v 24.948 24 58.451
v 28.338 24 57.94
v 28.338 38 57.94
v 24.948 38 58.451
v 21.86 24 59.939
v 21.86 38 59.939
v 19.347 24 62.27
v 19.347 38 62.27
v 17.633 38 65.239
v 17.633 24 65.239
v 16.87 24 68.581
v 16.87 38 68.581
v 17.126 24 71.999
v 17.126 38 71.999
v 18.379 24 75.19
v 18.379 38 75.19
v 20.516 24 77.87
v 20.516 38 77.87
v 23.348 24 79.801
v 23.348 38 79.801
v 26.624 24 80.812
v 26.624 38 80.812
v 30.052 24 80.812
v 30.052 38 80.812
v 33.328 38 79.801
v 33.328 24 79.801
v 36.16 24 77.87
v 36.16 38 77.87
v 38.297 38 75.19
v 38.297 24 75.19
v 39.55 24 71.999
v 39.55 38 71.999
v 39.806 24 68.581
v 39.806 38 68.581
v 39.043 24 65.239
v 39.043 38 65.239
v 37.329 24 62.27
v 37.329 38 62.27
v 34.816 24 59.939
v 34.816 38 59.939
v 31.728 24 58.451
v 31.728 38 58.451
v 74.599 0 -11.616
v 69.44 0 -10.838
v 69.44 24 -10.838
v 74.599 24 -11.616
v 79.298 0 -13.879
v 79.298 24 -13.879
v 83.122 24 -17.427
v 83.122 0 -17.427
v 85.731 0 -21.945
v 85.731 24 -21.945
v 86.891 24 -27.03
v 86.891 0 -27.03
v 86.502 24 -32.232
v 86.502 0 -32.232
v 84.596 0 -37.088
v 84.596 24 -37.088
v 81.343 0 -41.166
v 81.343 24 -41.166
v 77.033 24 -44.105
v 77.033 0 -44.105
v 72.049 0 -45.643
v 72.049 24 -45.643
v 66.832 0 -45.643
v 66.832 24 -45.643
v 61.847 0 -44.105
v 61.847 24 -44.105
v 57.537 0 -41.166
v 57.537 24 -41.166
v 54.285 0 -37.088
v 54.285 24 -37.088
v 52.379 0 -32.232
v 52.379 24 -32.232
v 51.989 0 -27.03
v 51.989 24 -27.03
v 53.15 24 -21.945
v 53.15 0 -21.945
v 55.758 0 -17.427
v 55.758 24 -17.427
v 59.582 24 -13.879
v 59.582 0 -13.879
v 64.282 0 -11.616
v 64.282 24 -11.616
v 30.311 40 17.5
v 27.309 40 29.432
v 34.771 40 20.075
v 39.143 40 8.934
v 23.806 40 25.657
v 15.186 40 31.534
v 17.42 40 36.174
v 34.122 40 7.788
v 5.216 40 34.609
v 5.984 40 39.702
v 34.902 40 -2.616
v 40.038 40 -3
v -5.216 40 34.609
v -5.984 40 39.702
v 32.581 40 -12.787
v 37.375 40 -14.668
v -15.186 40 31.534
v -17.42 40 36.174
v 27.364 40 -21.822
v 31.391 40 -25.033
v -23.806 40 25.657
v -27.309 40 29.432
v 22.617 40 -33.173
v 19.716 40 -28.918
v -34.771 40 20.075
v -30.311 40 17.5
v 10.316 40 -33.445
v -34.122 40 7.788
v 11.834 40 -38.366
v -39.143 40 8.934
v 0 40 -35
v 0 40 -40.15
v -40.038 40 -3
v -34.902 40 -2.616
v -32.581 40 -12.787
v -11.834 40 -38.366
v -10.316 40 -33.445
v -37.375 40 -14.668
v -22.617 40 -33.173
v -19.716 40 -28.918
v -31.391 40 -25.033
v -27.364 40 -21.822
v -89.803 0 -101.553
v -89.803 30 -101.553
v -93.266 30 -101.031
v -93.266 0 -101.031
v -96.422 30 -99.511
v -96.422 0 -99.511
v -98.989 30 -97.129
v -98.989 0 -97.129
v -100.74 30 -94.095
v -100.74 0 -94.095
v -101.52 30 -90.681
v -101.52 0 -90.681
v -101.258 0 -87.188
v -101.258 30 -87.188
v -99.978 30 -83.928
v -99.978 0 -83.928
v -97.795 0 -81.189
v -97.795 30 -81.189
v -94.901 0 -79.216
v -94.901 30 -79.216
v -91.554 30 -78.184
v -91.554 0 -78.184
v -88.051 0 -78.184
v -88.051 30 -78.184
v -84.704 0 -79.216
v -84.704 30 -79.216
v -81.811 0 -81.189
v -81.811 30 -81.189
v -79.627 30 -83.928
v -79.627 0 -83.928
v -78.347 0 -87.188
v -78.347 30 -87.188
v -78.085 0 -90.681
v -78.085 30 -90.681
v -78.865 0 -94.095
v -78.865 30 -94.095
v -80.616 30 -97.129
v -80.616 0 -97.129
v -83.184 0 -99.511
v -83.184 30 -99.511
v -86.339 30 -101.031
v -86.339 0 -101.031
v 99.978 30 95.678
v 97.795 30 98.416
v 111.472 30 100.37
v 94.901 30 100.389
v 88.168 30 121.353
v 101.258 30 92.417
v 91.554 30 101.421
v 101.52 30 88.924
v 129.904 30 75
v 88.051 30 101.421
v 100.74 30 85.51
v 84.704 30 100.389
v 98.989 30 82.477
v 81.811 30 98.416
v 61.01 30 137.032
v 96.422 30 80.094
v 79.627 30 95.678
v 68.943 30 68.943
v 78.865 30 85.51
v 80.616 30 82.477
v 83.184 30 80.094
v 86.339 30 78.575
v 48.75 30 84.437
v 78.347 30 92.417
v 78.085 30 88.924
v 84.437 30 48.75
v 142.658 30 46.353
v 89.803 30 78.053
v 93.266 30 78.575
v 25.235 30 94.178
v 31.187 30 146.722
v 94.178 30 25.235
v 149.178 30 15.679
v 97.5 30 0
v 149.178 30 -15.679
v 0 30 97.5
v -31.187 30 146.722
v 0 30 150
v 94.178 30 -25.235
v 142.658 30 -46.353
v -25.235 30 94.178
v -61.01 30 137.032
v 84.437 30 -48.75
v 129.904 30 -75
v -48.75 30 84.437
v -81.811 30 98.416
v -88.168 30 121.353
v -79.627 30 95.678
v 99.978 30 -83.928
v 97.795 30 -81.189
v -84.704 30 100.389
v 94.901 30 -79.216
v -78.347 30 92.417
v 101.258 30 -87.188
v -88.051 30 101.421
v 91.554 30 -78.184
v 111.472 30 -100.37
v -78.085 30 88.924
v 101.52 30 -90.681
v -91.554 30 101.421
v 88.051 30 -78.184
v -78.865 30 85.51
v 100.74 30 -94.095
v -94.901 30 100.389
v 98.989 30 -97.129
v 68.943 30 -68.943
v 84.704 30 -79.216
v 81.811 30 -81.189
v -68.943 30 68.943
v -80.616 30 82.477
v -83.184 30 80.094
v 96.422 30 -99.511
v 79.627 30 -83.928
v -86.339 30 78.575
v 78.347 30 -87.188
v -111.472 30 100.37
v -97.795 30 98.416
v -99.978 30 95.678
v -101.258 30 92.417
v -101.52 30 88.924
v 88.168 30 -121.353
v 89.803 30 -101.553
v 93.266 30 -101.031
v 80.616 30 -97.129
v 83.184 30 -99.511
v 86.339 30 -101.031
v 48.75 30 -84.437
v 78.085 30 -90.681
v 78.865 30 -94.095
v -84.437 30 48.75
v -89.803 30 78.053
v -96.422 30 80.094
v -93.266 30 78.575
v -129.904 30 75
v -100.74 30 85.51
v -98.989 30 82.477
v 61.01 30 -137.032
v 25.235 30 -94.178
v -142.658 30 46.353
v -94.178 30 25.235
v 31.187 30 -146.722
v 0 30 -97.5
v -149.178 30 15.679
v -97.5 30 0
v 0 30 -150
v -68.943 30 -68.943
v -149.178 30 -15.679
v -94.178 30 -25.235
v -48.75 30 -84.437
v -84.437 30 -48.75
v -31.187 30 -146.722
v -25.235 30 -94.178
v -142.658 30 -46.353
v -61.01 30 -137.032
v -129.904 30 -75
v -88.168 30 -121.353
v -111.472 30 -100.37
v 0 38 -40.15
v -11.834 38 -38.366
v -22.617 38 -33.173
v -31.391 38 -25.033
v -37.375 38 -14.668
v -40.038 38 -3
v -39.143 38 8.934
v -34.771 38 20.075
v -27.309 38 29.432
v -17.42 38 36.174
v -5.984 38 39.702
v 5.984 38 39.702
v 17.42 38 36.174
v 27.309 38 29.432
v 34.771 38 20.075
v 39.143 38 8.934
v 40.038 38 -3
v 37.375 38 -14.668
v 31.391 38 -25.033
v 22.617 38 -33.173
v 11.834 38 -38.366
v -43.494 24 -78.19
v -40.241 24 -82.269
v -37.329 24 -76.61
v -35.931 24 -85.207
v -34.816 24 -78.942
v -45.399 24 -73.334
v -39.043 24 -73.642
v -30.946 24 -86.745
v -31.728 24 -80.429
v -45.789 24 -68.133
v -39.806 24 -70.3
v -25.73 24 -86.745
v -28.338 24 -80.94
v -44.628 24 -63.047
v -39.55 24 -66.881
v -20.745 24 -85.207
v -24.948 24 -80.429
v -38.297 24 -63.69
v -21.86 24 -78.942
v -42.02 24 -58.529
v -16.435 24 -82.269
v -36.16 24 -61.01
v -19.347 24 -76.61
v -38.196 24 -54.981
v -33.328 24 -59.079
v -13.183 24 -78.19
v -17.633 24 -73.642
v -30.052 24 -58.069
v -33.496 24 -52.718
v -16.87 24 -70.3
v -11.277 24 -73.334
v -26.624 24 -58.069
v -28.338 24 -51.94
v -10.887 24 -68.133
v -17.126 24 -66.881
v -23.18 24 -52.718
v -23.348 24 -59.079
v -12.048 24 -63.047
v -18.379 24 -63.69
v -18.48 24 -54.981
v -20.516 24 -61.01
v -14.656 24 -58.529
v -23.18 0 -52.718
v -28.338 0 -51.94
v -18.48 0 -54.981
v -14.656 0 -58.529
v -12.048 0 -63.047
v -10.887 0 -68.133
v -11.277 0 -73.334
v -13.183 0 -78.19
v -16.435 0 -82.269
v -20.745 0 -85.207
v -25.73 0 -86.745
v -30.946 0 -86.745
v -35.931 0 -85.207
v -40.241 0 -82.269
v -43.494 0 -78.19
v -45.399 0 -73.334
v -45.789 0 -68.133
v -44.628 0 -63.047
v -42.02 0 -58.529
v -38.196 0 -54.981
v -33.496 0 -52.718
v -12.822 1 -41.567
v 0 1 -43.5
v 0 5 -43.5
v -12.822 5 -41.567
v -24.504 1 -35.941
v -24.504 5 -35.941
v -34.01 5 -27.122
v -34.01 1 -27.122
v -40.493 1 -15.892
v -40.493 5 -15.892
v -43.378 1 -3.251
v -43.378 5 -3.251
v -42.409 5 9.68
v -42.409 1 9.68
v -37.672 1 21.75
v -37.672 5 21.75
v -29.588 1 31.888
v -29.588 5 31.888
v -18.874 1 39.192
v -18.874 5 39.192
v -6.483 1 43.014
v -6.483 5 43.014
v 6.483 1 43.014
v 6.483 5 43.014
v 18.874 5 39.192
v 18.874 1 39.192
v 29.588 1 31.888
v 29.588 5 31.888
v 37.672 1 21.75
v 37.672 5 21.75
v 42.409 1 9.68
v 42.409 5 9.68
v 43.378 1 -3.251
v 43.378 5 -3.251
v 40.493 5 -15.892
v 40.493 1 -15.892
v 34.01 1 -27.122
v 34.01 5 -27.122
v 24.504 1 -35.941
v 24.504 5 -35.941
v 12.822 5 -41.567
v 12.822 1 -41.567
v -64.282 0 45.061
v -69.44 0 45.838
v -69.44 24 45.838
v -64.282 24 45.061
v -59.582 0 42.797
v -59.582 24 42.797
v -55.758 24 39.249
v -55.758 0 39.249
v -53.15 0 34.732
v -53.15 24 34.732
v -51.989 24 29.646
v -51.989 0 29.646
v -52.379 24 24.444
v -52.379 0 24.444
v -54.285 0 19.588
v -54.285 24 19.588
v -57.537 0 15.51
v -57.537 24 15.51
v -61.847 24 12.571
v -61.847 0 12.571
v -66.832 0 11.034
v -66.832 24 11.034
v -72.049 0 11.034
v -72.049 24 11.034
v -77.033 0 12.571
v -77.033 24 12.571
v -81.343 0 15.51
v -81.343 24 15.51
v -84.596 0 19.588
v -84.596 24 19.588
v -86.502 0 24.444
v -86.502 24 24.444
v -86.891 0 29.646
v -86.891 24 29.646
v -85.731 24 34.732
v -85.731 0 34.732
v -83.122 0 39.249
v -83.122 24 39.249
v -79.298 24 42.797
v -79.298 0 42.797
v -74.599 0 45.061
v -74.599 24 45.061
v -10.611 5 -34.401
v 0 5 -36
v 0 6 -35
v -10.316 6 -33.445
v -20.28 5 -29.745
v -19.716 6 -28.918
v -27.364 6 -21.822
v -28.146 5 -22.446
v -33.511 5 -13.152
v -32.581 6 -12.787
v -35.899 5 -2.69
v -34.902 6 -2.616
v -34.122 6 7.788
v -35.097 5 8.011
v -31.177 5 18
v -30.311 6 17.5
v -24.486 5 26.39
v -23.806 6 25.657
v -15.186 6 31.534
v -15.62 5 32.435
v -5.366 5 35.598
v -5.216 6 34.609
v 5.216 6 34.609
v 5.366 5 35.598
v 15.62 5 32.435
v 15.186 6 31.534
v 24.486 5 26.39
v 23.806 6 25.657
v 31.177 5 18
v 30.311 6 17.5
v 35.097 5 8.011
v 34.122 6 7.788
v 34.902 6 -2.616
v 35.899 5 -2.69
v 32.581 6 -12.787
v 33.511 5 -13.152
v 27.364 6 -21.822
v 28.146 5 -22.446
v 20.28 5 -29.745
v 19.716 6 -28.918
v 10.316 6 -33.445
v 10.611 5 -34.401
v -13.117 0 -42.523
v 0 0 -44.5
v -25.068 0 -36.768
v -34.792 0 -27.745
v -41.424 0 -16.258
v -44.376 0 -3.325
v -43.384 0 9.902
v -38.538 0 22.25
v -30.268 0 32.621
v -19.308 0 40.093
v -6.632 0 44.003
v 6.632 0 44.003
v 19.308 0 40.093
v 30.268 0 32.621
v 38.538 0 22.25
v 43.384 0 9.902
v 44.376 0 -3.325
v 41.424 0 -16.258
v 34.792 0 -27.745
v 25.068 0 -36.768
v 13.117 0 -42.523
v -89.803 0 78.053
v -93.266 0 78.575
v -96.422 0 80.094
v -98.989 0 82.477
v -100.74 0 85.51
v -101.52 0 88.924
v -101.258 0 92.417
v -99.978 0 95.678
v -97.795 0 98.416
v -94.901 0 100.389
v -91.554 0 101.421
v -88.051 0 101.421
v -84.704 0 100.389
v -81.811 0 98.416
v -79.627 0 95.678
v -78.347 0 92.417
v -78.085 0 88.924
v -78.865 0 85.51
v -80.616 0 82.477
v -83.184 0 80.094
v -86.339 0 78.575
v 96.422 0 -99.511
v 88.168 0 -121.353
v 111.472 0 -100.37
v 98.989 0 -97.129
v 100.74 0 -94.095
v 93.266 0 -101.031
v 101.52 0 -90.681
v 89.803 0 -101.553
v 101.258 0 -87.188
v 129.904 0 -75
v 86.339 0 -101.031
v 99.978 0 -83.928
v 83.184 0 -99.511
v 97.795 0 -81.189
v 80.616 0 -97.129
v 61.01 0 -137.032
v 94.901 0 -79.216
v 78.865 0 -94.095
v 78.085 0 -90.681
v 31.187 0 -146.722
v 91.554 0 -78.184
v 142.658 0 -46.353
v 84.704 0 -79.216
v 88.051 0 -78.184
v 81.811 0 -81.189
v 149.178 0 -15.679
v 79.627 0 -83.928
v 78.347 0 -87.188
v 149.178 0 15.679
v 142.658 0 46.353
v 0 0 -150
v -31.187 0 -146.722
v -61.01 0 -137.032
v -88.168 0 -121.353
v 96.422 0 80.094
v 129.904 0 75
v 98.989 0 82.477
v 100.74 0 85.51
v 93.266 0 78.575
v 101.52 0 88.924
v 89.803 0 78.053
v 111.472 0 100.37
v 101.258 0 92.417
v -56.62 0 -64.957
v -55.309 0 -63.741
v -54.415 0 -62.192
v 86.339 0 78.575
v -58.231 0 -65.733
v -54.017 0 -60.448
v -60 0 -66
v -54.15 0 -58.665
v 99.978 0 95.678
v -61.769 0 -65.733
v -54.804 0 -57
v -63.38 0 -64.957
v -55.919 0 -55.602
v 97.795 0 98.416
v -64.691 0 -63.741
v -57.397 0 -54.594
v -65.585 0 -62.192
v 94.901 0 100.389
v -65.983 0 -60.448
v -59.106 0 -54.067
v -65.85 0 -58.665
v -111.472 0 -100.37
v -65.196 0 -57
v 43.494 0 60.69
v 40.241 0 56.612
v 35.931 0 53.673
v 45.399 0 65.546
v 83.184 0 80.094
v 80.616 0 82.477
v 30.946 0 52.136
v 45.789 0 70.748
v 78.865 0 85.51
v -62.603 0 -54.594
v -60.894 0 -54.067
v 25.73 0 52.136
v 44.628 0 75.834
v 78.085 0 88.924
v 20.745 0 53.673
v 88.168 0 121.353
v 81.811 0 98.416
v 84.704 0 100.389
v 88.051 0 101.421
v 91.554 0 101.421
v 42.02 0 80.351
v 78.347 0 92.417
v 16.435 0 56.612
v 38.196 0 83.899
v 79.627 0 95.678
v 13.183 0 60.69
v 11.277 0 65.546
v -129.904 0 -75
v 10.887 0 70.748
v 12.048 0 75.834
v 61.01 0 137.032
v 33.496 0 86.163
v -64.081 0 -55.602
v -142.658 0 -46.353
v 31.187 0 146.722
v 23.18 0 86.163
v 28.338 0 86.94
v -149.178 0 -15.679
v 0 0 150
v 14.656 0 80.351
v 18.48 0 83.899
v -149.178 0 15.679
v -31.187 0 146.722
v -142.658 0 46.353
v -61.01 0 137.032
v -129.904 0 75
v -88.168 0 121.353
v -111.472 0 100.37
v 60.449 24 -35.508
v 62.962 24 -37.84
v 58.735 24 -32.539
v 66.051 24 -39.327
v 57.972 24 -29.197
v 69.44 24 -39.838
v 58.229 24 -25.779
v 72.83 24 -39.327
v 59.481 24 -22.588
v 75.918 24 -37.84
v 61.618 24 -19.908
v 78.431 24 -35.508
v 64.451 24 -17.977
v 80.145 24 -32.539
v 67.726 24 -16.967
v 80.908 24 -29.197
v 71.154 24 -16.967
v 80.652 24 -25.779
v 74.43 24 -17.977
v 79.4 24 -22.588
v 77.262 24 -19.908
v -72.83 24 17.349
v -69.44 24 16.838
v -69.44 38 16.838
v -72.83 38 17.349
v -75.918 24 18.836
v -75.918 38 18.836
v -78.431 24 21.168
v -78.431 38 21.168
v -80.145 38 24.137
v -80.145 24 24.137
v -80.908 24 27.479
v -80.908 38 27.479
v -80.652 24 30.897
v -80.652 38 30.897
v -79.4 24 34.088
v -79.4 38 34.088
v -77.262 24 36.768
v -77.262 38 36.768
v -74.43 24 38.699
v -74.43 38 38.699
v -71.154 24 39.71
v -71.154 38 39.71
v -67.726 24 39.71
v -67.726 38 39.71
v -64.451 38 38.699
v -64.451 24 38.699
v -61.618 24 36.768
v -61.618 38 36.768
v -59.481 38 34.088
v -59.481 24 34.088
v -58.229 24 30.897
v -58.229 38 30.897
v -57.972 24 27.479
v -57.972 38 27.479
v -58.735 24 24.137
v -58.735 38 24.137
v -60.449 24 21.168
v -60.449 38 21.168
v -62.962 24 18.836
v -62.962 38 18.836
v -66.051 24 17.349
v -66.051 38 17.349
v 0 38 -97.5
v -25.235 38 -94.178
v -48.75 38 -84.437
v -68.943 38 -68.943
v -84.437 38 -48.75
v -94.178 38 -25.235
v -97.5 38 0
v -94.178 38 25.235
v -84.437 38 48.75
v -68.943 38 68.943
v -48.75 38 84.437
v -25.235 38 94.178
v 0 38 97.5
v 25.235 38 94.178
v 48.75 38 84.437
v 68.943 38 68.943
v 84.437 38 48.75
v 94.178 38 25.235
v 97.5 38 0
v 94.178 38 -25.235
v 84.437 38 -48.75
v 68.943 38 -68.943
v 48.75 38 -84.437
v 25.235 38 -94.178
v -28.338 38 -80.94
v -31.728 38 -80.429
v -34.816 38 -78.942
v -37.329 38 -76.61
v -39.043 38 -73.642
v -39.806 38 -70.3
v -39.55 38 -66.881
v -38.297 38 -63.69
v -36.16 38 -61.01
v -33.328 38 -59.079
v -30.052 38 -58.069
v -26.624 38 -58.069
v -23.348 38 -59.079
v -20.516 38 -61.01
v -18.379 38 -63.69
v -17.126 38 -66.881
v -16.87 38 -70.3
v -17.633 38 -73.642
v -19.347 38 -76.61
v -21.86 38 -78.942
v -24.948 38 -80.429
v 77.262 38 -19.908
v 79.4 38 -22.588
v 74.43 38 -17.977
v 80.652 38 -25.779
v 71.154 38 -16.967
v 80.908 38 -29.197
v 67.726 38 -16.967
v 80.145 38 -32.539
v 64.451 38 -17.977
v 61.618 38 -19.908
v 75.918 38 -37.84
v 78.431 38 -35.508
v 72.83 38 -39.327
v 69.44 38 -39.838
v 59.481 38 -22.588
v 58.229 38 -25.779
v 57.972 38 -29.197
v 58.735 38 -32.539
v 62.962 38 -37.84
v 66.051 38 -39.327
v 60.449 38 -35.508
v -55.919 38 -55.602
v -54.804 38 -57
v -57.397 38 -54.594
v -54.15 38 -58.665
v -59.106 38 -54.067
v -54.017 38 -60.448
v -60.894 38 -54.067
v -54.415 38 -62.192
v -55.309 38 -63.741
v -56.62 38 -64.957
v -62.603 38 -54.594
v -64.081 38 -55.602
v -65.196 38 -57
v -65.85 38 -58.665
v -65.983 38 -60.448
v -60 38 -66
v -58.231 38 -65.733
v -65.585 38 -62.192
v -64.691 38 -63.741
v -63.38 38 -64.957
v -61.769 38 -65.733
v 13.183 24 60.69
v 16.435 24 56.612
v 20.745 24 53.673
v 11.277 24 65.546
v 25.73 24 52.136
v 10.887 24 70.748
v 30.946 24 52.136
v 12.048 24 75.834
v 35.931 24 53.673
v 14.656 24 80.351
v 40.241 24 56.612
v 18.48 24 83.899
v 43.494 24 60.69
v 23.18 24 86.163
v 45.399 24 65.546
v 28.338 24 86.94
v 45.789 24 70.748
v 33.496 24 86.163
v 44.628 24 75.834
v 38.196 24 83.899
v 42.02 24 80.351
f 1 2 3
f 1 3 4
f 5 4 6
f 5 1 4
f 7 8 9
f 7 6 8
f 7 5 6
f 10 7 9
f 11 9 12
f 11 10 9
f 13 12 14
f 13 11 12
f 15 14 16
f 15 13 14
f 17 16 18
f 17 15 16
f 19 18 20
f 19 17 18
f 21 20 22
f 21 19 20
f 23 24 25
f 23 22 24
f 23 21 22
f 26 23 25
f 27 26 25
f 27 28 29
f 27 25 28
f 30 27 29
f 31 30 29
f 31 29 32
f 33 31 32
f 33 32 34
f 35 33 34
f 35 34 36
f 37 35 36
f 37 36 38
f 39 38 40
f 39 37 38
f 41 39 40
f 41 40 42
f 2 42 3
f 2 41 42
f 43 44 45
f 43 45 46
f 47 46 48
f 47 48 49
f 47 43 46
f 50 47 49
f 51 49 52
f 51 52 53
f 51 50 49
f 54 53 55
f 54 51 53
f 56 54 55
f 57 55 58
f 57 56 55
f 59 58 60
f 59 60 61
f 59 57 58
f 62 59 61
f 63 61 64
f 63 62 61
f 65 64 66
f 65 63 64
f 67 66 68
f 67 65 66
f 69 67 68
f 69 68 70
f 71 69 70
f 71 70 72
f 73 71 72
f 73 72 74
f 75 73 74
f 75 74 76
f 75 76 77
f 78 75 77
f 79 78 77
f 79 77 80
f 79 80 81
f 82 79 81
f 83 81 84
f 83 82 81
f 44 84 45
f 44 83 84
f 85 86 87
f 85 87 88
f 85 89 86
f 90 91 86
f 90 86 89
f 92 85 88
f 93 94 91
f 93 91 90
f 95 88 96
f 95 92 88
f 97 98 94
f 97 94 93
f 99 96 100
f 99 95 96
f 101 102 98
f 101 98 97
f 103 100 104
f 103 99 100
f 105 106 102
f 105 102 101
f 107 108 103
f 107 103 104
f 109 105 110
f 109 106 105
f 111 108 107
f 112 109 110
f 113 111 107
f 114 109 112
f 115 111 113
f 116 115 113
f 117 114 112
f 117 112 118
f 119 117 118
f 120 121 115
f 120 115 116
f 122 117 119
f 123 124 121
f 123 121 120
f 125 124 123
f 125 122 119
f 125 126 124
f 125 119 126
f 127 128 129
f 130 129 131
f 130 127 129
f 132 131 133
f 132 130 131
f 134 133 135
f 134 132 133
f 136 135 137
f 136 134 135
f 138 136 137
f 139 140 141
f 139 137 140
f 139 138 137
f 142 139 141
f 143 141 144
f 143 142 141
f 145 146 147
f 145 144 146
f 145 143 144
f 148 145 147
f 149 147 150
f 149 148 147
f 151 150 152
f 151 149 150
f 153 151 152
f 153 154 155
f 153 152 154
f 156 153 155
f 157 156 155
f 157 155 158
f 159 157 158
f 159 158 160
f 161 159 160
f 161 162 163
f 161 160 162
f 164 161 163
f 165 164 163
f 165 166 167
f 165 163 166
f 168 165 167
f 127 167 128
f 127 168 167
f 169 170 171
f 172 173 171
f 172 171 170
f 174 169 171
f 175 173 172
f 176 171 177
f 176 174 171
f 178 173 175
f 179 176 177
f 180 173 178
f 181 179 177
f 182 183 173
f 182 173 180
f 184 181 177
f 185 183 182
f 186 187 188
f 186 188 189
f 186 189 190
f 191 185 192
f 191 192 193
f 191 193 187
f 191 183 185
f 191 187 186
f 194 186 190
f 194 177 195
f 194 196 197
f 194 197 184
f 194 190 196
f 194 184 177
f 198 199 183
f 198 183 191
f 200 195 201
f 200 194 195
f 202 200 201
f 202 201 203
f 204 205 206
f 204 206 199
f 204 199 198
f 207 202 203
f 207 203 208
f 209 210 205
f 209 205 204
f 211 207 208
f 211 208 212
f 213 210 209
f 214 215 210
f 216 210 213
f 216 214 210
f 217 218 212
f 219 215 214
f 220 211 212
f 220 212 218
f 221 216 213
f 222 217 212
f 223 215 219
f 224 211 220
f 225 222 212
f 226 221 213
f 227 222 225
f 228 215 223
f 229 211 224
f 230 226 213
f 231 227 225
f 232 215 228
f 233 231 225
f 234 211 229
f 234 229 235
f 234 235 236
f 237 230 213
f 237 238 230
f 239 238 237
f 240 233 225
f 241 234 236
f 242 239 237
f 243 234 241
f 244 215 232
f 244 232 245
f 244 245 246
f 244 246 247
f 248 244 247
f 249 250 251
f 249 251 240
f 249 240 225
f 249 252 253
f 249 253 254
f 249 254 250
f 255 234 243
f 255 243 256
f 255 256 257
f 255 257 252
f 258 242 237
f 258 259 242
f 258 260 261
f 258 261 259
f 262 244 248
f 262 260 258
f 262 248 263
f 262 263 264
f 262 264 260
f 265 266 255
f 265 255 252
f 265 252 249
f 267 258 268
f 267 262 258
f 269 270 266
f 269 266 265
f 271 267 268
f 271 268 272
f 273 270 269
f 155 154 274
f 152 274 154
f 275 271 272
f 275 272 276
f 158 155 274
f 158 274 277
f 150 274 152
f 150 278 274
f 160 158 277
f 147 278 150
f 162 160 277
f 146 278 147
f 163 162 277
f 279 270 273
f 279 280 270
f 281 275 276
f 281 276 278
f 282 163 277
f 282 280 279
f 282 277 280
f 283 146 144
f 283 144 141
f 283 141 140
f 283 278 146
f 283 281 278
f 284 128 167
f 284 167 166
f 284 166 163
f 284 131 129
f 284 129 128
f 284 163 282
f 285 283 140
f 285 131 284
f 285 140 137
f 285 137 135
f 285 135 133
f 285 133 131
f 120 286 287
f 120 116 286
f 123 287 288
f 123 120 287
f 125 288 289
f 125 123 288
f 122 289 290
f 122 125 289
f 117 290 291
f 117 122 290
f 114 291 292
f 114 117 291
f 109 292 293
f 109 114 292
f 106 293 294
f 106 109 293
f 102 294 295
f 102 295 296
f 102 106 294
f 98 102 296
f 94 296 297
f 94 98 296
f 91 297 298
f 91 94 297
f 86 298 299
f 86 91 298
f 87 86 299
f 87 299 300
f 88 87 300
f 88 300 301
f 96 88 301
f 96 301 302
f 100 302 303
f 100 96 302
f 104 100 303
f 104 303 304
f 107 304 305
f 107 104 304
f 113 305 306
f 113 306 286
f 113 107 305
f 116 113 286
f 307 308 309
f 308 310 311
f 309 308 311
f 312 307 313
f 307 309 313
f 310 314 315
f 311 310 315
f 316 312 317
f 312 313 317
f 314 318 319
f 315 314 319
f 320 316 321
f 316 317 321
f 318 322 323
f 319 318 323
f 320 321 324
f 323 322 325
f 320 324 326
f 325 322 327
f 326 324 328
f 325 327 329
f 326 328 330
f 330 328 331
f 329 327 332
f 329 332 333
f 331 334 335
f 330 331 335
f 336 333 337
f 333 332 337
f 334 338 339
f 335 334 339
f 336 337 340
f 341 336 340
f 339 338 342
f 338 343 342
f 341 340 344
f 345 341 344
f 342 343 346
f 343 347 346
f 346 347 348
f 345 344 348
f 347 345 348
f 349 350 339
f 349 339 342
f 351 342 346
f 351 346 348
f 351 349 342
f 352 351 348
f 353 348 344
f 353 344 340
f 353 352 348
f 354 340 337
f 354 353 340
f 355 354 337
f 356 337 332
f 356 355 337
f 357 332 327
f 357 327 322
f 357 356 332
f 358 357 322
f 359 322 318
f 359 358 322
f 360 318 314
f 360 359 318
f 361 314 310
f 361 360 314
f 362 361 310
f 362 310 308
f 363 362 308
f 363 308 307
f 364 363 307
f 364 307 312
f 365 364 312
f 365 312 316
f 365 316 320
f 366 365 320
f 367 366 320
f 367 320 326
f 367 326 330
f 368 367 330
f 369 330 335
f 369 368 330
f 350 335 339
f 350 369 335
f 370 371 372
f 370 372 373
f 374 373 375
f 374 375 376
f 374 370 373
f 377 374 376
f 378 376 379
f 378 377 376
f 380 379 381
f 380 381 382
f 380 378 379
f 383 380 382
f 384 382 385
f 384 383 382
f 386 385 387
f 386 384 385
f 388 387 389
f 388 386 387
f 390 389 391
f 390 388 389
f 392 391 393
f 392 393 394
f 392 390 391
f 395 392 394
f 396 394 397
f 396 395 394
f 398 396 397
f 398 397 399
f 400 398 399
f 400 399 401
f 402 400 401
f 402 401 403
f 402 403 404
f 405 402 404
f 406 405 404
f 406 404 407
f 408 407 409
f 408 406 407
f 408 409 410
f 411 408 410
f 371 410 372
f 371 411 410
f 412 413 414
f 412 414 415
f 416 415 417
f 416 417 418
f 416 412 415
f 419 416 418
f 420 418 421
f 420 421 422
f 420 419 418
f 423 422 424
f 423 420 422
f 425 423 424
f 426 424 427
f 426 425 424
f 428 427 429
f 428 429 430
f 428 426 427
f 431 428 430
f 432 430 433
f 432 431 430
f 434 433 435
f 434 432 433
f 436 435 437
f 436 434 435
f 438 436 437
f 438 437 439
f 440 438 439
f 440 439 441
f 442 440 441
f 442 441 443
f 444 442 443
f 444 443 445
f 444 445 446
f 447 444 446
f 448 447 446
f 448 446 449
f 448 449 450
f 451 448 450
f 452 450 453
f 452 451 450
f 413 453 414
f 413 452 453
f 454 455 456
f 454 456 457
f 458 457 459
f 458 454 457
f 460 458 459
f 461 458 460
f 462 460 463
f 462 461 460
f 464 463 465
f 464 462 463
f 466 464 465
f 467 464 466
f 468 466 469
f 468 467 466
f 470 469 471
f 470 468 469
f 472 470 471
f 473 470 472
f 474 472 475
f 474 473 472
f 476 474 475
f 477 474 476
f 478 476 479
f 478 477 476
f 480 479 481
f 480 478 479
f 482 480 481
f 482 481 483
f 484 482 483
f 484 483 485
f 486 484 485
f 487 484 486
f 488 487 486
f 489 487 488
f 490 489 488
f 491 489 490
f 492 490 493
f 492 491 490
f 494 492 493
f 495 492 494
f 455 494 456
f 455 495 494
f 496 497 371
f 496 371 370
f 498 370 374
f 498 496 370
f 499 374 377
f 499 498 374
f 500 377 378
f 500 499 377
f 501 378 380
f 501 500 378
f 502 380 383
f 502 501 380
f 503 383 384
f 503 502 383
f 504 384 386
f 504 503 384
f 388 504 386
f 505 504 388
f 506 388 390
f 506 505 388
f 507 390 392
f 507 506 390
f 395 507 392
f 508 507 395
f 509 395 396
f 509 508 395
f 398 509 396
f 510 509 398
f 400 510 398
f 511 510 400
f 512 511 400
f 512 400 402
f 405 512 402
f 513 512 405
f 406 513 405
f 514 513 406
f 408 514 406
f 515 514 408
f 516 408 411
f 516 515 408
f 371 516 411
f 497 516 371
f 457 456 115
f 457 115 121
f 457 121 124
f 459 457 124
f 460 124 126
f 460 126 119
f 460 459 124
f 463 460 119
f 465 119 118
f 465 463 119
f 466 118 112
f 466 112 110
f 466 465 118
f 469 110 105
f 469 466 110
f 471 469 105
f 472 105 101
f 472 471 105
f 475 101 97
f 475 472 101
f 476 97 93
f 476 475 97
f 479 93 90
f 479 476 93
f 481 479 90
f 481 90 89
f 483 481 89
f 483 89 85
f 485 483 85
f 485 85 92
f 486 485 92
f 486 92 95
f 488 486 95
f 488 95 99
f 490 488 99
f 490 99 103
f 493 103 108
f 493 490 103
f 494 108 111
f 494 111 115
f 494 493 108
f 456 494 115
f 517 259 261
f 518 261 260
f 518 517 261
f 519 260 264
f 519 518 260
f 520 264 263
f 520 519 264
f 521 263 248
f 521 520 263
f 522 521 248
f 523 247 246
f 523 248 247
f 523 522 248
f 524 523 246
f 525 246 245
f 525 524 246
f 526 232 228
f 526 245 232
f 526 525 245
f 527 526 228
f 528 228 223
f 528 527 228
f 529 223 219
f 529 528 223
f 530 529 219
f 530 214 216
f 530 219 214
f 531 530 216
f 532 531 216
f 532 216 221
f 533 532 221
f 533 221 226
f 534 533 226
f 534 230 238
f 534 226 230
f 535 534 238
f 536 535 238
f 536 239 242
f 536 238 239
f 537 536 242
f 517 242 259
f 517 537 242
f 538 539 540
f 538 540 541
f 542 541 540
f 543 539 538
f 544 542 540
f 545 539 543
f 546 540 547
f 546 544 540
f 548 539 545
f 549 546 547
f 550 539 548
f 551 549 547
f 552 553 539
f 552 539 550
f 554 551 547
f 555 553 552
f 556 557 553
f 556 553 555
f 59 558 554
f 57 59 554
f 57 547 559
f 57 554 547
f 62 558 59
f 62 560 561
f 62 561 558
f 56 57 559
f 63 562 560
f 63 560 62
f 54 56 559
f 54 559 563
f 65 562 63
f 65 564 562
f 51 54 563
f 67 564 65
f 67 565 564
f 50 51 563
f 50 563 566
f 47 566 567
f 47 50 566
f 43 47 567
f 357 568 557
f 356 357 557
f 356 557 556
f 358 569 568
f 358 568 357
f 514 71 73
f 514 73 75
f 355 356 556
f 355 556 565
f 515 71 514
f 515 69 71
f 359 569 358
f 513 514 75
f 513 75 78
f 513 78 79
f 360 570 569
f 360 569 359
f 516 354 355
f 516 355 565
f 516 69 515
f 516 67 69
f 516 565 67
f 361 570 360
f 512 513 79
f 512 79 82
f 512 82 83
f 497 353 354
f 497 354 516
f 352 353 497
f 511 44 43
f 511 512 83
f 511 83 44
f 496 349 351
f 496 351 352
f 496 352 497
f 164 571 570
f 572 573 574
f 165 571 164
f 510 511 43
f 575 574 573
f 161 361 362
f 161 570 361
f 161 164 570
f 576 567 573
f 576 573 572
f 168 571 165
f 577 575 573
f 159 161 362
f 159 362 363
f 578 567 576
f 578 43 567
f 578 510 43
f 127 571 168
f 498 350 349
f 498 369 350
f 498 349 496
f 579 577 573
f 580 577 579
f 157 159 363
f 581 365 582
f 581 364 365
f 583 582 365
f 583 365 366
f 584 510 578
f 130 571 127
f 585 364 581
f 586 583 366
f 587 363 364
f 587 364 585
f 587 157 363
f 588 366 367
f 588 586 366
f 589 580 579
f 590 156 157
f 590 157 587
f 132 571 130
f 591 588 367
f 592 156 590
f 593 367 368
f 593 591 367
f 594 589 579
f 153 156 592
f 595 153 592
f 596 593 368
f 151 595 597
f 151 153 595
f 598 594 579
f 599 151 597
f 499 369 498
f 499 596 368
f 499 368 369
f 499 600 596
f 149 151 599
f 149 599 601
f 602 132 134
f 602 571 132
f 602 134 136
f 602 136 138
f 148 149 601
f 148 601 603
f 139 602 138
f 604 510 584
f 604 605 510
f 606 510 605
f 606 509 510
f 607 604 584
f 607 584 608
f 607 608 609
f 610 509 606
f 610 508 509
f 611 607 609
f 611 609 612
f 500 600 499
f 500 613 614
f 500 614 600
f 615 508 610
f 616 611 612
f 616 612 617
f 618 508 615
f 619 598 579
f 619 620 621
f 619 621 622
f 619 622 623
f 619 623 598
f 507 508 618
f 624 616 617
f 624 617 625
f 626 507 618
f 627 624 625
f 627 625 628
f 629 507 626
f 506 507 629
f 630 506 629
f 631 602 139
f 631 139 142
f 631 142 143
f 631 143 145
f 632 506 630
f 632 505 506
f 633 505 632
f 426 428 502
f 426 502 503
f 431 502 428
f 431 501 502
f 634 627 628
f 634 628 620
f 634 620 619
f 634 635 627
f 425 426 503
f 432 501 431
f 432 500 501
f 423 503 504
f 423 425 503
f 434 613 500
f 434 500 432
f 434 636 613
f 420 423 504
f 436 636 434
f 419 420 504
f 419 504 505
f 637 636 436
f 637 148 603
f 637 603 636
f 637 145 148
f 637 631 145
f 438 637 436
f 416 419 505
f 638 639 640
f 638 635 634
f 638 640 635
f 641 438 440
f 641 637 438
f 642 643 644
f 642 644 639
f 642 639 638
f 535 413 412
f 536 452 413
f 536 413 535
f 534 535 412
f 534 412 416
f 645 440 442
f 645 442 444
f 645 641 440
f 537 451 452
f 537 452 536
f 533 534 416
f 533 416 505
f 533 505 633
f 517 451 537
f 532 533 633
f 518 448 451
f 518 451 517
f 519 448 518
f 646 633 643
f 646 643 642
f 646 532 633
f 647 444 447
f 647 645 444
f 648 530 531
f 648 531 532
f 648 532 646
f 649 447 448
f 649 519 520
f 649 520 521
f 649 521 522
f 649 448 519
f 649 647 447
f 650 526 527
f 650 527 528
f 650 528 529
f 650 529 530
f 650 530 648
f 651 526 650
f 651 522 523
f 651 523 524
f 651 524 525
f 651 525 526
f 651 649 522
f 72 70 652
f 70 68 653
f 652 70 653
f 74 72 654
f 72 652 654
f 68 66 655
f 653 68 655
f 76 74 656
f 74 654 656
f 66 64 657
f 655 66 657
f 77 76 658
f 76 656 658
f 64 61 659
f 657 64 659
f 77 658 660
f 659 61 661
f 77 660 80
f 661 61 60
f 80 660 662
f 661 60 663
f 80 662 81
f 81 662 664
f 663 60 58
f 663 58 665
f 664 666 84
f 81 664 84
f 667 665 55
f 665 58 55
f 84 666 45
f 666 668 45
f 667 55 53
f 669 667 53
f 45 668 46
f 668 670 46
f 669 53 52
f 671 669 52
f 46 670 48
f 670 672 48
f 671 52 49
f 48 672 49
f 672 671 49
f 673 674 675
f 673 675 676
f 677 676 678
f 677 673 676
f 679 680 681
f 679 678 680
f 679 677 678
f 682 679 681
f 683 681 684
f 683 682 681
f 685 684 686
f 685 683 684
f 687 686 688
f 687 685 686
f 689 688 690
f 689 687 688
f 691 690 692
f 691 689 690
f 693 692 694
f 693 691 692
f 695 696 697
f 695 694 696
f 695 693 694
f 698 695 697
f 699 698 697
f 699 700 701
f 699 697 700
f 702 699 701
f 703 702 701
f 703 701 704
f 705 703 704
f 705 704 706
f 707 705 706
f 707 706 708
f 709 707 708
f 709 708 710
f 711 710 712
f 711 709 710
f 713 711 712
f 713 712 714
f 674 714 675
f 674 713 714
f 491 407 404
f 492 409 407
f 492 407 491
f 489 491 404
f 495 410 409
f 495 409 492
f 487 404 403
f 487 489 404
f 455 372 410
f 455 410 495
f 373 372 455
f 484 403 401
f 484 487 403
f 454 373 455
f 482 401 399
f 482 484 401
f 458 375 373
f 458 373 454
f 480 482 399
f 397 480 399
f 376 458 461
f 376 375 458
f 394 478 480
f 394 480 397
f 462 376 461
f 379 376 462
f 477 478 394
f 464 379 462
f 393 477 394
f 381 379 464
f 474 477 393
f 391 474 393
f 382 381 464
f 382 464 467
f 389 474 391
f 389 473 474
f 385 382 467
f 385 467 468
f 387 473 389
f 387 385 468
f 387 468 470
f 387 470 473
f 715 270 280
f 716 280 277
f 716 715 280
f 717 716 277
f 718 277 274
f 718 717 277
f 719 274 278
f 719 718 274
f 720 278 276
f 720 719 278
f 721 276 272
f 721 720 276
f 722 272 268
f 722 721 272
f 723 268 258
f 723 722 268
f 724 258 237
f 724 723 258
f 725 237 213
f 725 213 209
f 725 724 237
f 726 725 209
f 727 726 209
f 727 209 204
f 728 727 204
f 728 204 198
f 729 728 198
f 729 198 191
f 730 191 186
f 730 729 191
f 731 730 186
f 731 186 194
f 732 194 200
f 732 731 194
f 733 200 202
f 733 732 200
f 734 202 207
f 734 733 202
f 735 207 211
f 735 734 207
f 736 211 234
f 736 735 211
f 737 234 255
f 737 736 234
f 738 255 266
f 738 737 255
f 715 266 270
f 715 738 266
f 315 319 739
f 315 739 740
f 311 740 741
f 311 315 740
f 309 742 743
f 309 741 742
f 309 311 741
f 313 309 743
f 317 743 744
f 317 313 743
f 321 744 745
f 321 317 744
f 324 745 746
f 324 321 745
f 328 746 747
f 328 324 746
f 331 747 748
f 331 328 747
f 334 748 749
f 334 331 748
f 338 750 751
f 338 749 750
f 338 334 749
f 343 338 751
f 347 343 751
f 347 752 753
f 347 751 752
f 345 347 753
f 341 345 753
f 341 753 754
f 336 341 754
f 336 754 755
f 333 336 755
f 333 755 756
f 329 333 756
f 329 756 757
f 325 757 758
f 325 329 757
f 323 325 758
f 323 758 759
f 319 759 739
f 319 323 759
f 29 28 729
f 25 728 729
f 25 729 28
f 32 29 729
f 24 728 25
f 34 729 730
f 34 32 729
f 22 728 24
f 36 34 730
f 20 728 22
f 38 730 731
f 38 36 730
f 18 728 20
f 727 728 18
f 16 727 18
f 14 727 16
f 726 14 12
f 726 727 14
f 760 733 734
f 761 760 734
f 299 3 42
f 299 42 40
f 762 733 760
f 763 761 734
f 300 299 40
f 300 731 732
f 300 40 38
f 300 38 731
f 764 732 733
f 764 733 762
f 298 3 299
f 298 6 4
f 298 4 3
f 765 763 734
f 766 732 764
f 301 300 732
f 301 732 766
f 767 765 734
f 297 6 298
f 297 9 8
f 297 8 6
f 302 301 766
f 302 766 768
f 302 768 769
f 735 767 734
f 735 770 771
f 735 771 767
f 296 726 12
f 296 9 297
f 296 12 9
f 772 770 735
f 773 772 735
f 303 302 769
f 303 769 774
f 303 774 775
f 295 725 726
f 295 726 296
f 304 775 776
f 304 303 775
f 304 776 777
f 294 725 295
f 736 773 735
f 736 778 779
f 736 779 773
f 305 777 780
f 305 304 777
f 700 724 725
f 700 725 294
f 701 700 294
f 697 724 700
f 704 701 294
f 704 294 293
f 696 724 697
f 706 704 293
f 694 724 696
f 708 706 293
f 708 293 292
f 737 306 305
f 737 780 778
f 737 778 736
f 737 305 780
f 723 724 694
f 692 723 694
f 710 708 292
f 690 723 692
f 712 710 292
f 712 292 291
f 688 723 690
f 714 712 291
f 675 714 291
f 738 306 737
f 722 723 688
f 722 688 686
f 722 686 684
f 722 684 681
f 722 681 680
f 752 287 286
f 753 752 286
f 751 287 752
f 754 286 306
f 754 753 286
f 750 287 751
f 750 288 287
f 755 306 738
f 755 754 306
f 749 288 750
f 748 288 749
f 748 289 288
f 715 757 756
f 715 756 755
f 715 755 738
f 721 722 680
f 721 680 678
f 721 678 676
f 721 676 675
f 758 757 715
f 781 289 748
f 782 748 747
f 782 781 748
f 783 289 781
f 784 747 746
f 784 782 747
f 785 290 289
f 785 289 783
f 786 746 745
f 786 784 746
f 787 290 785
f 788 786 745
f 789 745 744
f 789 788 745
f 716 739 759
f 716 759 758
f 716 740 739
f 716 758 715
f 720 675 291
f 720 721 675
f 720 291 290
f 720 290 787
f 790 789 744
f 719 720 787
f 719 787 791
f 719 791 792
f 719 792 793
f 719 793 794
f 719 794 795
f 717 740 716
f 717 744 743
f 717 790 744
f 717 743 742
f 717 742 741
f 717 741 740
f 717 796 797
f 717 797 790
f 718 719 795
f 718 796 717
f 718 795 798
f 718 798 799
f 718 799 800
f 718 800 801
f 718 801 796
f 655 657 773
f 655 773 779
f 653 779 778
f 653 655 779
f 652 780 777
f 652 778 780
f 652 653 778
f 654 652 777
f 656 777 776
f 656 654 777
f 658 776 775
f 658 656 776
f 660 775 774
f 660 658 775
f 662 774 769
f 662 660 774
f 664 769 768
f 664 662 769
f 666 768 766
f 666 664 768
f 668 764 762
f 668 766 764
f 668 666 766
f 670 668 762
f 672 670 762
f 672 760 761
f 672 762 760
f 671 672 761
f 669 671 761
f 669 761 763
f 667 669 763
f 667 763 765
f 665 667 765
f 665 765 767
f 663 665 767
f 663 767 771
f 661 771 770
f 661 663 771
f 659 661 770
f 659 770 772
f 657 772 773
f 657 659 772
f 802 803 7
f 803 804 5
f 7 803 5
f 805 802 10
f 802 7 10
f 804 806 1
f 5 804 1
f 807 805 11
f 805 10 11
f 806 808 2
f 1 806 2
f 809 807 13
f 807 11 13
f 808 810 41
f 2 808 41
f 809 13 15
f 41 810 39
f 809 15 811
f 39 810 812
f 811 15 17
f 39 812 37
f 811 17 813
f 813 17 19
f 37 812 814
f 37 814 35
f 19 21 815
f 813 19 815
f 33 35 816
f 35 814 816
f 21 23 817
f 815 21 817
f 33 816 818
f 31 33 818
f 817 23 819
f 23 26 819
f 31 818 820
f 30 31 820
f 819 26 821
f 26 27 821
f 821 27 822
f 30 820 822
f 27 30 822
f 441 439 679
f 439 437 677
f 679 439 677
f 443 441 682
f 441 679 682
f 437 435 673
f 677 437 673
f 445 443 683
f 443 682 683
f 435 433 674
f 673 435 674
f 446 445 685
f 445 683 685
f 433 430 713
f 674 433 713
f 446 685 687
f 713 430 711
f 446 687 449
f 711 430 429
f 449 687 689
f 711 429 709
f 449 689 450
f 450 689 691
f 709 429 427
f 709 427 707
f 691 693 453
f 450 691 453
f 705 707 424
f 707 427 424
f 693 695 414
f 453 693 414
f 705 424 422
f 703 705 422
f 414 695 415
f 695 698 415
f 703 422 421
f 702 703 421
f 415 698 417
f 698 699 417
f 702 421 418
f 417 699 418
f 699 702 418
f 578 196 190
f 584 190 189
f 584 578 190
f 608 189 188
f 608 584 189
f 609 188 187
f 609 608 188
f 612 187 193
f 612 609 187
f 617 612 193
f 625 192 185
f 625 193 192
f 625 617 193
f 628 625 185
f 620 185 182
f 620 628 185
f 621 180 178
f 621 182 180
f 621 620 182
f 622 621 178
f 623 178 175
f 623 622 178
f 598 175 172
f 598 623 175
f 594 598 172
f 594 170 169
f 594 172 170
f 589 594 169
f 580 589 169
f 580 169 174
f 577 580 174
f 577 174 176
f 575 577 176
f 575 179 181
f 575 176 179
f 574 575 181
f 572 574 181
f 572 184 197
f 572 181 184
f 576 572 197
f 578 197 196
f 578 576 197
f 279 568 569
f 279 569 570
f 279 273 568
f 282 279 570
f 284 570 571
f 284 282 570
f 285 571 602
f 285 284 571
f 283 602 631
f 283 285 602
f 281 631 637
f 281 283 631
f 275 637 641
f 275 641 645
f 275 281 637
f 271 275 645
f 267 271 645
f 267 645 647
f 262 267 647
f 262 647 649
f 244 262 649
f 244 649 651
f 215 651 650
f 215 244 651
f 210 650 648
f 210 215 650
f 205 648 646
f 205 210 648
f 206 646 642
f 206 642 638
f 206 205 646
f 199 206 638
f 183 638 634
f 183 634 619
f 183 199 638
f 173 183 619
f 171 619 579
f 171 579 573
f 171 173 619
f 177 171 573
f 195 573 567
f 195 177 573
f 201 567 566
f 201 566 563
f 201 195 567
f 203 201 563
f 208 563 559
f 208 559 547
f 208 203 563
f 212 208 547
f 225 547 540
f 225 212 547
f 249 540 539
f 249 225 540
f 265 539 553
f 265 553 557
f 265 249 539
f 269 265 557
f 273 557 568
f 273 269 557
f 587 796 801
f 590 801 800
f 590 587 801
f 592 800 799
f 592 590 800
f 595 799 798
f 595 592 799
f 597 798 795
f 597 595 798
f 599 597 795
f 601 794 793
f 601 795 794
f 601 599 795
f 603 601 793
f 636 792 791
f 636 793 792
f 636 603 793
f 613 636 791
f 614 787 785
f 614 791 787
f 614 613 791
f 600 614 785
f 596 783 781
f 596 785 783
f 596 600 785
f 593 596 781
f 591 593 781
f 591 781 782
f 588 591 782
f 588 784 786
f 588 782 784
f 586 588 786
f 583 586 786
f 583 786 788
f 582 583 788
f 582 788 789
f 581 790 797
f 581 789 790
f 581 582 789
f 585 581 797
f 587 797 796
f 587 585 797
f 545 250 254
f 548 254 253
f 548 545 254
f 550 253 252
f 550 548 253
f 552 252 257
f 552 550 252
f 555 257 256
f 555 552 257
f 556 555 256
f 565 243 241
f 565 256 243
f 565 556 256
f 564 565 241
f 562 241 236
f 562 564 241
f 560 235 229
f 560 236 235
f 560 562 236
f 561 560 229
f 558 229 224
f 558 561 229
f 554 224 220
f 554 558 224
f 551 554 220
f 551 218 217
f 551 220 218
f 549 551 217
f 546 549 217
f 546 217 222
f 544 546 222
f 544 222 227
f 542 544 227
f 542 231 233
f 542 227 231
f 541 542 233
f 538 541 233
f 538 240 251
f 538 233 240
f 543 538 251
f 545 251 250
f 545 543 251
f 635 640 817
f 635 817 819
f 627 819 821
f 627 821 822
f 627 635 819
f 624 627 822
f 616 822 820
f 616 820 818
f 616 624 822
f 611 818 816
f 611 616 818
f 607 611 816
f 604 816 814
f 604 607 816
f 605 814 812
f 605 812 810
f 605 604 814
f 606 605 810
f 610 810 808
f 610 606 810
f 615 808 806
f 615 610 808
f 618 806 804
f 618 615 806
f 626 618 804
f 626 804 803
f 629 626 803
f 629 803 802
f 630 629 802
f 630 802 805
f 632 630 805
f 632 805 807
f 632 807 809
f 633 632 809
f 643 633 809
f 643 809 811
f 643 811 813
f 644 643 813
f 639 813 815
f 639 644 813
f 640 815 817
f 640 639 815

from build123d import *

# Parameters (mm, degrees)
CHAMFER_1_SIZE      = 1
CUT_EXTRUDE_1_REACH = 42
SKETCH_2_R          = 6
SKETCH_2_R_2        = 11.75
CUT_EXTRUDE_2_REACH = 42
SKETCH_3_R          = 11.5
SKETCH_4_R          = 17.5
CUT_EXTRUDE_3_DEPTH = 24


with BuildPart() as part:
    # 스케치1 → 회전1 (revolve)
    with BuildSketch(Plane.XY, mode=Mode.PRIVATE) as revolve_1_sk:
        Polygon((-150, 0), (-150, 30), (-97.5, 30), (-97.5, 38), (-40.15, 38), (-40.15, 40), (-35, 40), (-35, 5), (-43.5, 5), (-43.5, 0), align=None)
    revolve(revolve_1_sk.sketch.rotate(Axis((0, 0, 0), (0, 1, 0)), 270), axis=Axis((0, 0, 0), (0, 1, 0)))  # turned: the seam where the file's is

    # 모따기1
    chamfer_1_edges = [part.edges().sort_by_distance(p)[0] for p in [
        (0, 0, 43.5),
        (0, 5, 35),
    ]]
    chamfer(chamfer_1_edges, length=CHAMFER_1_SIZE)

    # 스케치2 → 컷-돌출1 (cut, up to next)
    with BuildSketch(Plane(origin=(0, 0, 0), x_dir=(1, 0, 0), z_dir=(0, 1, 0)), mode=Mode.PRIVATE) as cut_extrude_1_sk1:
        with Locations(Location((-60, 60, 0), (0, 0, 90))):  # turned: the seam where the file's is
            Circle(SKETCH_2_R)
    cut_extrude_1_tool1 = extrude(cut_extrude_1_sk1.sketch, amount=CUT_EXTRUDE_1_REACH, mode=Mode.PRIVATE) & part.part
    add(cut_extrude_1_tool1.solids().sort_by_distance((-60, 0, -60))[0], mode=Mode.SUBTRACT)
    # 스케치2 → 컷-돌출1 (cut, up to next)
    with BuildSketch(Plane(origin=(0, 0, 0), x_dir=(1, 0, 0), z_dir=(0, 1, 0)), mode=Mode.PRIVATE) as cut_extrude_1_sk2:
        with Locations(Location((-89.802561211, 89.802561211, 0), (0, 0, 90))):  # turned: the seam where the file's is
            Circle(SKETCH_2_R_2)
    cut_extrude_1_tool2 = extrude(cut_extrude_1_sk2.sketch, amount=CUT_EXTRUDE_1_REACH, mode=Mode.PRIVATE) & part.part
    add(cut_extrude_1_tool2.solids().sort_by_distance((-89.802561, 0, -89.802561))[0], mode=Mode.SUBTRACT)
    # 스케치2 → 컷-돌출1 (cut, up to next)
    with BuildSketch(Plane(origin=(0, 0, 0), x_dir=(1, 0, 0), z_dir=(0, 1, 0)), mode=Mode.PRIVATE) as cut_extrude_1_sk3:
        with Locations(Location((89.802561211, 89.802561211, 0), (0, 0, 90))):  # turned: the seam where the file's is
            Circle(SKETCH_2_R_2)
    cut_extrude_1_tool3 = extrude(cut_extrude_1_sk3.sketch, amount=CUT_EXTRUDE_1_REACH, mode=Mode.PRIVATE) & part.part
    add(cut_extrude_1_tool3.solids().sort_by_distance((89.802561, 0, -89.802561))[0], mode=Mode.SUBTRACT)
    # 스케치2 → 컷-돌출1 (cut, up to next)
    with BuildSketch(Plane(origin=(0, 0, 0), x_dir=(1, 0, 0), z_dir=(0, 1, 0)), mode=Mode.PRIVATE) as cut_extrude_1_sk4:
        with Locations(Location((89.802561211, -89.802561211, 0), (0, 0, 90))):  # turned: the seam where the file's is
            Circle(SKETCH_2_R_2)
    cut_extrude_1_tool4 = extrude(cut_extrude_1_sk4.sketch, amount=CUT_EXTRUDE_1_REACH, mode=Mode.PRIVATE) & part.part
    add(cut_extrude_1_tool4.solids().sort_by_distance((89.802561, 0, 89.802561))[0], mode=Mode.SUBTRACT)
    # 스케치2 → 컷-돌출1 (cut, up to next)
    with BuildSketch(Plane(origin=(0, 0, 0), x_dir=(1, 0, 0), z_dir=(0, 1, 0)), mode=Mode.PRIVATE) as cut_extrude_1_sk5:
        with Locations(Location((-89.802561211, -89.802561211, 0), (0, 0, 90))):  # turned: the seam where the file's is
            Circle(SKETCH_2_R_2)
    cut_extrude_1_tool5 = extrude(cut_extrude_1_sk5.sketch, amount=CUT_EXTRUDE_1_REACH, mode=Mode.PRIVATE) & part.part
    add(cut_extrude_1_tool5.solids().sort_by_distance((-89.802561, 0, 89.802561))[0], mode=Mode.SUBTRACT)

    # 스케치3 → 컷-돌출2 (cut, up to next)
    with BuildSketch(Plane(origin=(0, 0, 0), x_dir=(1, 0, 0), z_dir=(0, 1, 0)), mode=Mode.PRIVATE) as cut_extrude_2_sk1:
        with Locations(Location((-28.338059011, 69.440293861, 0), (0, 0, 90))):  # turned: the seam where the file's is
            Circle(SKETCH_3_R)
    cut_extrude_2_tool1 = extrude(cut_extrude_2_sk1.sketch, amount=CUT_EXTRUDE_2_REACH, mode=Mode.PRIVATE) & part.part
    add(cut_extrude_2_tool1.solids().sort_by_distance((-28.338059, 0, -69.440294))[0], mode=Mode.SUBTRACT)
    # 스케치3 → 컷-돌출2 (cut, up to next)
    with BuildSketch(Plane(origin=(0, 0, 0), x_dir=(1, 0, 0), z_dir=(0, 1, 0)), mode=Mode.PRIVATE) as cut_extrude_2_sk2:
        with Locations(Location((69.440293861, 28.338059011, 0), (0, 0, 90))):  # turned: the seam where the file's is
            Circle(SKETCH_3_R)
    cut_extrude_2_tool2 = extrude(cut_extrude_2_sk2.sketch, amount=CUT_EXTRUDE_2_REACH, mode=Mode.PRIVATE) & part.part
    add(cut_extrude_2_tool2.solids().sort_by_distance((69.440294, 0, -28.338059))[0], mode=Mode.SUBTRACT)
    # 스케치3 → 컷-돌출2 (cut, up to next)
    with BuildSketch(Plane(origin=(0, 0, 0), x_dir=(1, 0, 0), z_dir=(0, 1, 0)), mode=Mode.PRIVATE) as cut_extrude_2_sk3:
        with Locations(Location((28.338059011, -69.440293861, 0), (0, 0, 90))):  # turned: the seam where the file's is
            Circle(SKETCH_3_R)
    cut_extrude_2_tool3 = extrude(cut_extrude_2_sk3.sketch, amount=CUT_EXTRUDE_2_REACH, mode=Mode.PRIVATE) & part.part
    add(cut_extrude_2_tool3.solids().sort_by_distance((28.338059, 0, 69.440294))[0], mode=Mode.SUBTRACT)
    # 스케치3 → 컷-돌출2 (cut, up to next)
    with BuildSketch(Plane(origin=(0, 0, 0), x_dir=(1, 0, 0), z_dir=(0, 1, 0)), mode=Mode.PRIVATE) as cut_extrude_2_sk4:
        with Locations(Location((-69.440293861, -28.338059011, 0), (0, 0, 90))):  # turned: the seam where the file's is
            Circle(SKETCH_3_R)
    cut_extrude_2_tool4 = extrude(cut_extrude_2_sk4.sketch, amount=CUT_EXTRUDE_2_REACH, mode=Mode.PRIVATE) & part.part
    add(cut_extrude_2_tool4.solids().sort_by_distance((-69.440294, 0, 28.338059))[0], mode=Mode.SUBTRACT)

    # 스케치4 → 컷-돌출3 (cut)
    with BuildSketch(Plane(origin=(0, 0, 0), x_dir=(1, 0, 0), z_dir=(0, 1, 0))):
        with Locations(Location((-28.338059011, 69.440293861, 0), (0, 0, 270))):  # turned: the seam where the file's is
            Circle(SKETCH_4_R)
        with Locations(Location((-69.440293861, -28.338059011, 0), (0, 0, 270))):  # turned: the seam where the file's is
            Circle(SKETCH_4_R)
        with Locations(Location((69.440293861, 28.338059011, 0), (0, 0, 270))):  # turned: the seam where the file's is
            Circle(SKETCH_4_R)
        with Locations(Location((28.338059011, -69.440293861, 0), (0, 0, 270))):  # turned: the seam where the file's is
            Circle(SKETCH_4_R)
    extrude(amount=CUT_EXTRUDE_3_DEPTH, mode=Mode.SUBTRACT)


solid = part.part
